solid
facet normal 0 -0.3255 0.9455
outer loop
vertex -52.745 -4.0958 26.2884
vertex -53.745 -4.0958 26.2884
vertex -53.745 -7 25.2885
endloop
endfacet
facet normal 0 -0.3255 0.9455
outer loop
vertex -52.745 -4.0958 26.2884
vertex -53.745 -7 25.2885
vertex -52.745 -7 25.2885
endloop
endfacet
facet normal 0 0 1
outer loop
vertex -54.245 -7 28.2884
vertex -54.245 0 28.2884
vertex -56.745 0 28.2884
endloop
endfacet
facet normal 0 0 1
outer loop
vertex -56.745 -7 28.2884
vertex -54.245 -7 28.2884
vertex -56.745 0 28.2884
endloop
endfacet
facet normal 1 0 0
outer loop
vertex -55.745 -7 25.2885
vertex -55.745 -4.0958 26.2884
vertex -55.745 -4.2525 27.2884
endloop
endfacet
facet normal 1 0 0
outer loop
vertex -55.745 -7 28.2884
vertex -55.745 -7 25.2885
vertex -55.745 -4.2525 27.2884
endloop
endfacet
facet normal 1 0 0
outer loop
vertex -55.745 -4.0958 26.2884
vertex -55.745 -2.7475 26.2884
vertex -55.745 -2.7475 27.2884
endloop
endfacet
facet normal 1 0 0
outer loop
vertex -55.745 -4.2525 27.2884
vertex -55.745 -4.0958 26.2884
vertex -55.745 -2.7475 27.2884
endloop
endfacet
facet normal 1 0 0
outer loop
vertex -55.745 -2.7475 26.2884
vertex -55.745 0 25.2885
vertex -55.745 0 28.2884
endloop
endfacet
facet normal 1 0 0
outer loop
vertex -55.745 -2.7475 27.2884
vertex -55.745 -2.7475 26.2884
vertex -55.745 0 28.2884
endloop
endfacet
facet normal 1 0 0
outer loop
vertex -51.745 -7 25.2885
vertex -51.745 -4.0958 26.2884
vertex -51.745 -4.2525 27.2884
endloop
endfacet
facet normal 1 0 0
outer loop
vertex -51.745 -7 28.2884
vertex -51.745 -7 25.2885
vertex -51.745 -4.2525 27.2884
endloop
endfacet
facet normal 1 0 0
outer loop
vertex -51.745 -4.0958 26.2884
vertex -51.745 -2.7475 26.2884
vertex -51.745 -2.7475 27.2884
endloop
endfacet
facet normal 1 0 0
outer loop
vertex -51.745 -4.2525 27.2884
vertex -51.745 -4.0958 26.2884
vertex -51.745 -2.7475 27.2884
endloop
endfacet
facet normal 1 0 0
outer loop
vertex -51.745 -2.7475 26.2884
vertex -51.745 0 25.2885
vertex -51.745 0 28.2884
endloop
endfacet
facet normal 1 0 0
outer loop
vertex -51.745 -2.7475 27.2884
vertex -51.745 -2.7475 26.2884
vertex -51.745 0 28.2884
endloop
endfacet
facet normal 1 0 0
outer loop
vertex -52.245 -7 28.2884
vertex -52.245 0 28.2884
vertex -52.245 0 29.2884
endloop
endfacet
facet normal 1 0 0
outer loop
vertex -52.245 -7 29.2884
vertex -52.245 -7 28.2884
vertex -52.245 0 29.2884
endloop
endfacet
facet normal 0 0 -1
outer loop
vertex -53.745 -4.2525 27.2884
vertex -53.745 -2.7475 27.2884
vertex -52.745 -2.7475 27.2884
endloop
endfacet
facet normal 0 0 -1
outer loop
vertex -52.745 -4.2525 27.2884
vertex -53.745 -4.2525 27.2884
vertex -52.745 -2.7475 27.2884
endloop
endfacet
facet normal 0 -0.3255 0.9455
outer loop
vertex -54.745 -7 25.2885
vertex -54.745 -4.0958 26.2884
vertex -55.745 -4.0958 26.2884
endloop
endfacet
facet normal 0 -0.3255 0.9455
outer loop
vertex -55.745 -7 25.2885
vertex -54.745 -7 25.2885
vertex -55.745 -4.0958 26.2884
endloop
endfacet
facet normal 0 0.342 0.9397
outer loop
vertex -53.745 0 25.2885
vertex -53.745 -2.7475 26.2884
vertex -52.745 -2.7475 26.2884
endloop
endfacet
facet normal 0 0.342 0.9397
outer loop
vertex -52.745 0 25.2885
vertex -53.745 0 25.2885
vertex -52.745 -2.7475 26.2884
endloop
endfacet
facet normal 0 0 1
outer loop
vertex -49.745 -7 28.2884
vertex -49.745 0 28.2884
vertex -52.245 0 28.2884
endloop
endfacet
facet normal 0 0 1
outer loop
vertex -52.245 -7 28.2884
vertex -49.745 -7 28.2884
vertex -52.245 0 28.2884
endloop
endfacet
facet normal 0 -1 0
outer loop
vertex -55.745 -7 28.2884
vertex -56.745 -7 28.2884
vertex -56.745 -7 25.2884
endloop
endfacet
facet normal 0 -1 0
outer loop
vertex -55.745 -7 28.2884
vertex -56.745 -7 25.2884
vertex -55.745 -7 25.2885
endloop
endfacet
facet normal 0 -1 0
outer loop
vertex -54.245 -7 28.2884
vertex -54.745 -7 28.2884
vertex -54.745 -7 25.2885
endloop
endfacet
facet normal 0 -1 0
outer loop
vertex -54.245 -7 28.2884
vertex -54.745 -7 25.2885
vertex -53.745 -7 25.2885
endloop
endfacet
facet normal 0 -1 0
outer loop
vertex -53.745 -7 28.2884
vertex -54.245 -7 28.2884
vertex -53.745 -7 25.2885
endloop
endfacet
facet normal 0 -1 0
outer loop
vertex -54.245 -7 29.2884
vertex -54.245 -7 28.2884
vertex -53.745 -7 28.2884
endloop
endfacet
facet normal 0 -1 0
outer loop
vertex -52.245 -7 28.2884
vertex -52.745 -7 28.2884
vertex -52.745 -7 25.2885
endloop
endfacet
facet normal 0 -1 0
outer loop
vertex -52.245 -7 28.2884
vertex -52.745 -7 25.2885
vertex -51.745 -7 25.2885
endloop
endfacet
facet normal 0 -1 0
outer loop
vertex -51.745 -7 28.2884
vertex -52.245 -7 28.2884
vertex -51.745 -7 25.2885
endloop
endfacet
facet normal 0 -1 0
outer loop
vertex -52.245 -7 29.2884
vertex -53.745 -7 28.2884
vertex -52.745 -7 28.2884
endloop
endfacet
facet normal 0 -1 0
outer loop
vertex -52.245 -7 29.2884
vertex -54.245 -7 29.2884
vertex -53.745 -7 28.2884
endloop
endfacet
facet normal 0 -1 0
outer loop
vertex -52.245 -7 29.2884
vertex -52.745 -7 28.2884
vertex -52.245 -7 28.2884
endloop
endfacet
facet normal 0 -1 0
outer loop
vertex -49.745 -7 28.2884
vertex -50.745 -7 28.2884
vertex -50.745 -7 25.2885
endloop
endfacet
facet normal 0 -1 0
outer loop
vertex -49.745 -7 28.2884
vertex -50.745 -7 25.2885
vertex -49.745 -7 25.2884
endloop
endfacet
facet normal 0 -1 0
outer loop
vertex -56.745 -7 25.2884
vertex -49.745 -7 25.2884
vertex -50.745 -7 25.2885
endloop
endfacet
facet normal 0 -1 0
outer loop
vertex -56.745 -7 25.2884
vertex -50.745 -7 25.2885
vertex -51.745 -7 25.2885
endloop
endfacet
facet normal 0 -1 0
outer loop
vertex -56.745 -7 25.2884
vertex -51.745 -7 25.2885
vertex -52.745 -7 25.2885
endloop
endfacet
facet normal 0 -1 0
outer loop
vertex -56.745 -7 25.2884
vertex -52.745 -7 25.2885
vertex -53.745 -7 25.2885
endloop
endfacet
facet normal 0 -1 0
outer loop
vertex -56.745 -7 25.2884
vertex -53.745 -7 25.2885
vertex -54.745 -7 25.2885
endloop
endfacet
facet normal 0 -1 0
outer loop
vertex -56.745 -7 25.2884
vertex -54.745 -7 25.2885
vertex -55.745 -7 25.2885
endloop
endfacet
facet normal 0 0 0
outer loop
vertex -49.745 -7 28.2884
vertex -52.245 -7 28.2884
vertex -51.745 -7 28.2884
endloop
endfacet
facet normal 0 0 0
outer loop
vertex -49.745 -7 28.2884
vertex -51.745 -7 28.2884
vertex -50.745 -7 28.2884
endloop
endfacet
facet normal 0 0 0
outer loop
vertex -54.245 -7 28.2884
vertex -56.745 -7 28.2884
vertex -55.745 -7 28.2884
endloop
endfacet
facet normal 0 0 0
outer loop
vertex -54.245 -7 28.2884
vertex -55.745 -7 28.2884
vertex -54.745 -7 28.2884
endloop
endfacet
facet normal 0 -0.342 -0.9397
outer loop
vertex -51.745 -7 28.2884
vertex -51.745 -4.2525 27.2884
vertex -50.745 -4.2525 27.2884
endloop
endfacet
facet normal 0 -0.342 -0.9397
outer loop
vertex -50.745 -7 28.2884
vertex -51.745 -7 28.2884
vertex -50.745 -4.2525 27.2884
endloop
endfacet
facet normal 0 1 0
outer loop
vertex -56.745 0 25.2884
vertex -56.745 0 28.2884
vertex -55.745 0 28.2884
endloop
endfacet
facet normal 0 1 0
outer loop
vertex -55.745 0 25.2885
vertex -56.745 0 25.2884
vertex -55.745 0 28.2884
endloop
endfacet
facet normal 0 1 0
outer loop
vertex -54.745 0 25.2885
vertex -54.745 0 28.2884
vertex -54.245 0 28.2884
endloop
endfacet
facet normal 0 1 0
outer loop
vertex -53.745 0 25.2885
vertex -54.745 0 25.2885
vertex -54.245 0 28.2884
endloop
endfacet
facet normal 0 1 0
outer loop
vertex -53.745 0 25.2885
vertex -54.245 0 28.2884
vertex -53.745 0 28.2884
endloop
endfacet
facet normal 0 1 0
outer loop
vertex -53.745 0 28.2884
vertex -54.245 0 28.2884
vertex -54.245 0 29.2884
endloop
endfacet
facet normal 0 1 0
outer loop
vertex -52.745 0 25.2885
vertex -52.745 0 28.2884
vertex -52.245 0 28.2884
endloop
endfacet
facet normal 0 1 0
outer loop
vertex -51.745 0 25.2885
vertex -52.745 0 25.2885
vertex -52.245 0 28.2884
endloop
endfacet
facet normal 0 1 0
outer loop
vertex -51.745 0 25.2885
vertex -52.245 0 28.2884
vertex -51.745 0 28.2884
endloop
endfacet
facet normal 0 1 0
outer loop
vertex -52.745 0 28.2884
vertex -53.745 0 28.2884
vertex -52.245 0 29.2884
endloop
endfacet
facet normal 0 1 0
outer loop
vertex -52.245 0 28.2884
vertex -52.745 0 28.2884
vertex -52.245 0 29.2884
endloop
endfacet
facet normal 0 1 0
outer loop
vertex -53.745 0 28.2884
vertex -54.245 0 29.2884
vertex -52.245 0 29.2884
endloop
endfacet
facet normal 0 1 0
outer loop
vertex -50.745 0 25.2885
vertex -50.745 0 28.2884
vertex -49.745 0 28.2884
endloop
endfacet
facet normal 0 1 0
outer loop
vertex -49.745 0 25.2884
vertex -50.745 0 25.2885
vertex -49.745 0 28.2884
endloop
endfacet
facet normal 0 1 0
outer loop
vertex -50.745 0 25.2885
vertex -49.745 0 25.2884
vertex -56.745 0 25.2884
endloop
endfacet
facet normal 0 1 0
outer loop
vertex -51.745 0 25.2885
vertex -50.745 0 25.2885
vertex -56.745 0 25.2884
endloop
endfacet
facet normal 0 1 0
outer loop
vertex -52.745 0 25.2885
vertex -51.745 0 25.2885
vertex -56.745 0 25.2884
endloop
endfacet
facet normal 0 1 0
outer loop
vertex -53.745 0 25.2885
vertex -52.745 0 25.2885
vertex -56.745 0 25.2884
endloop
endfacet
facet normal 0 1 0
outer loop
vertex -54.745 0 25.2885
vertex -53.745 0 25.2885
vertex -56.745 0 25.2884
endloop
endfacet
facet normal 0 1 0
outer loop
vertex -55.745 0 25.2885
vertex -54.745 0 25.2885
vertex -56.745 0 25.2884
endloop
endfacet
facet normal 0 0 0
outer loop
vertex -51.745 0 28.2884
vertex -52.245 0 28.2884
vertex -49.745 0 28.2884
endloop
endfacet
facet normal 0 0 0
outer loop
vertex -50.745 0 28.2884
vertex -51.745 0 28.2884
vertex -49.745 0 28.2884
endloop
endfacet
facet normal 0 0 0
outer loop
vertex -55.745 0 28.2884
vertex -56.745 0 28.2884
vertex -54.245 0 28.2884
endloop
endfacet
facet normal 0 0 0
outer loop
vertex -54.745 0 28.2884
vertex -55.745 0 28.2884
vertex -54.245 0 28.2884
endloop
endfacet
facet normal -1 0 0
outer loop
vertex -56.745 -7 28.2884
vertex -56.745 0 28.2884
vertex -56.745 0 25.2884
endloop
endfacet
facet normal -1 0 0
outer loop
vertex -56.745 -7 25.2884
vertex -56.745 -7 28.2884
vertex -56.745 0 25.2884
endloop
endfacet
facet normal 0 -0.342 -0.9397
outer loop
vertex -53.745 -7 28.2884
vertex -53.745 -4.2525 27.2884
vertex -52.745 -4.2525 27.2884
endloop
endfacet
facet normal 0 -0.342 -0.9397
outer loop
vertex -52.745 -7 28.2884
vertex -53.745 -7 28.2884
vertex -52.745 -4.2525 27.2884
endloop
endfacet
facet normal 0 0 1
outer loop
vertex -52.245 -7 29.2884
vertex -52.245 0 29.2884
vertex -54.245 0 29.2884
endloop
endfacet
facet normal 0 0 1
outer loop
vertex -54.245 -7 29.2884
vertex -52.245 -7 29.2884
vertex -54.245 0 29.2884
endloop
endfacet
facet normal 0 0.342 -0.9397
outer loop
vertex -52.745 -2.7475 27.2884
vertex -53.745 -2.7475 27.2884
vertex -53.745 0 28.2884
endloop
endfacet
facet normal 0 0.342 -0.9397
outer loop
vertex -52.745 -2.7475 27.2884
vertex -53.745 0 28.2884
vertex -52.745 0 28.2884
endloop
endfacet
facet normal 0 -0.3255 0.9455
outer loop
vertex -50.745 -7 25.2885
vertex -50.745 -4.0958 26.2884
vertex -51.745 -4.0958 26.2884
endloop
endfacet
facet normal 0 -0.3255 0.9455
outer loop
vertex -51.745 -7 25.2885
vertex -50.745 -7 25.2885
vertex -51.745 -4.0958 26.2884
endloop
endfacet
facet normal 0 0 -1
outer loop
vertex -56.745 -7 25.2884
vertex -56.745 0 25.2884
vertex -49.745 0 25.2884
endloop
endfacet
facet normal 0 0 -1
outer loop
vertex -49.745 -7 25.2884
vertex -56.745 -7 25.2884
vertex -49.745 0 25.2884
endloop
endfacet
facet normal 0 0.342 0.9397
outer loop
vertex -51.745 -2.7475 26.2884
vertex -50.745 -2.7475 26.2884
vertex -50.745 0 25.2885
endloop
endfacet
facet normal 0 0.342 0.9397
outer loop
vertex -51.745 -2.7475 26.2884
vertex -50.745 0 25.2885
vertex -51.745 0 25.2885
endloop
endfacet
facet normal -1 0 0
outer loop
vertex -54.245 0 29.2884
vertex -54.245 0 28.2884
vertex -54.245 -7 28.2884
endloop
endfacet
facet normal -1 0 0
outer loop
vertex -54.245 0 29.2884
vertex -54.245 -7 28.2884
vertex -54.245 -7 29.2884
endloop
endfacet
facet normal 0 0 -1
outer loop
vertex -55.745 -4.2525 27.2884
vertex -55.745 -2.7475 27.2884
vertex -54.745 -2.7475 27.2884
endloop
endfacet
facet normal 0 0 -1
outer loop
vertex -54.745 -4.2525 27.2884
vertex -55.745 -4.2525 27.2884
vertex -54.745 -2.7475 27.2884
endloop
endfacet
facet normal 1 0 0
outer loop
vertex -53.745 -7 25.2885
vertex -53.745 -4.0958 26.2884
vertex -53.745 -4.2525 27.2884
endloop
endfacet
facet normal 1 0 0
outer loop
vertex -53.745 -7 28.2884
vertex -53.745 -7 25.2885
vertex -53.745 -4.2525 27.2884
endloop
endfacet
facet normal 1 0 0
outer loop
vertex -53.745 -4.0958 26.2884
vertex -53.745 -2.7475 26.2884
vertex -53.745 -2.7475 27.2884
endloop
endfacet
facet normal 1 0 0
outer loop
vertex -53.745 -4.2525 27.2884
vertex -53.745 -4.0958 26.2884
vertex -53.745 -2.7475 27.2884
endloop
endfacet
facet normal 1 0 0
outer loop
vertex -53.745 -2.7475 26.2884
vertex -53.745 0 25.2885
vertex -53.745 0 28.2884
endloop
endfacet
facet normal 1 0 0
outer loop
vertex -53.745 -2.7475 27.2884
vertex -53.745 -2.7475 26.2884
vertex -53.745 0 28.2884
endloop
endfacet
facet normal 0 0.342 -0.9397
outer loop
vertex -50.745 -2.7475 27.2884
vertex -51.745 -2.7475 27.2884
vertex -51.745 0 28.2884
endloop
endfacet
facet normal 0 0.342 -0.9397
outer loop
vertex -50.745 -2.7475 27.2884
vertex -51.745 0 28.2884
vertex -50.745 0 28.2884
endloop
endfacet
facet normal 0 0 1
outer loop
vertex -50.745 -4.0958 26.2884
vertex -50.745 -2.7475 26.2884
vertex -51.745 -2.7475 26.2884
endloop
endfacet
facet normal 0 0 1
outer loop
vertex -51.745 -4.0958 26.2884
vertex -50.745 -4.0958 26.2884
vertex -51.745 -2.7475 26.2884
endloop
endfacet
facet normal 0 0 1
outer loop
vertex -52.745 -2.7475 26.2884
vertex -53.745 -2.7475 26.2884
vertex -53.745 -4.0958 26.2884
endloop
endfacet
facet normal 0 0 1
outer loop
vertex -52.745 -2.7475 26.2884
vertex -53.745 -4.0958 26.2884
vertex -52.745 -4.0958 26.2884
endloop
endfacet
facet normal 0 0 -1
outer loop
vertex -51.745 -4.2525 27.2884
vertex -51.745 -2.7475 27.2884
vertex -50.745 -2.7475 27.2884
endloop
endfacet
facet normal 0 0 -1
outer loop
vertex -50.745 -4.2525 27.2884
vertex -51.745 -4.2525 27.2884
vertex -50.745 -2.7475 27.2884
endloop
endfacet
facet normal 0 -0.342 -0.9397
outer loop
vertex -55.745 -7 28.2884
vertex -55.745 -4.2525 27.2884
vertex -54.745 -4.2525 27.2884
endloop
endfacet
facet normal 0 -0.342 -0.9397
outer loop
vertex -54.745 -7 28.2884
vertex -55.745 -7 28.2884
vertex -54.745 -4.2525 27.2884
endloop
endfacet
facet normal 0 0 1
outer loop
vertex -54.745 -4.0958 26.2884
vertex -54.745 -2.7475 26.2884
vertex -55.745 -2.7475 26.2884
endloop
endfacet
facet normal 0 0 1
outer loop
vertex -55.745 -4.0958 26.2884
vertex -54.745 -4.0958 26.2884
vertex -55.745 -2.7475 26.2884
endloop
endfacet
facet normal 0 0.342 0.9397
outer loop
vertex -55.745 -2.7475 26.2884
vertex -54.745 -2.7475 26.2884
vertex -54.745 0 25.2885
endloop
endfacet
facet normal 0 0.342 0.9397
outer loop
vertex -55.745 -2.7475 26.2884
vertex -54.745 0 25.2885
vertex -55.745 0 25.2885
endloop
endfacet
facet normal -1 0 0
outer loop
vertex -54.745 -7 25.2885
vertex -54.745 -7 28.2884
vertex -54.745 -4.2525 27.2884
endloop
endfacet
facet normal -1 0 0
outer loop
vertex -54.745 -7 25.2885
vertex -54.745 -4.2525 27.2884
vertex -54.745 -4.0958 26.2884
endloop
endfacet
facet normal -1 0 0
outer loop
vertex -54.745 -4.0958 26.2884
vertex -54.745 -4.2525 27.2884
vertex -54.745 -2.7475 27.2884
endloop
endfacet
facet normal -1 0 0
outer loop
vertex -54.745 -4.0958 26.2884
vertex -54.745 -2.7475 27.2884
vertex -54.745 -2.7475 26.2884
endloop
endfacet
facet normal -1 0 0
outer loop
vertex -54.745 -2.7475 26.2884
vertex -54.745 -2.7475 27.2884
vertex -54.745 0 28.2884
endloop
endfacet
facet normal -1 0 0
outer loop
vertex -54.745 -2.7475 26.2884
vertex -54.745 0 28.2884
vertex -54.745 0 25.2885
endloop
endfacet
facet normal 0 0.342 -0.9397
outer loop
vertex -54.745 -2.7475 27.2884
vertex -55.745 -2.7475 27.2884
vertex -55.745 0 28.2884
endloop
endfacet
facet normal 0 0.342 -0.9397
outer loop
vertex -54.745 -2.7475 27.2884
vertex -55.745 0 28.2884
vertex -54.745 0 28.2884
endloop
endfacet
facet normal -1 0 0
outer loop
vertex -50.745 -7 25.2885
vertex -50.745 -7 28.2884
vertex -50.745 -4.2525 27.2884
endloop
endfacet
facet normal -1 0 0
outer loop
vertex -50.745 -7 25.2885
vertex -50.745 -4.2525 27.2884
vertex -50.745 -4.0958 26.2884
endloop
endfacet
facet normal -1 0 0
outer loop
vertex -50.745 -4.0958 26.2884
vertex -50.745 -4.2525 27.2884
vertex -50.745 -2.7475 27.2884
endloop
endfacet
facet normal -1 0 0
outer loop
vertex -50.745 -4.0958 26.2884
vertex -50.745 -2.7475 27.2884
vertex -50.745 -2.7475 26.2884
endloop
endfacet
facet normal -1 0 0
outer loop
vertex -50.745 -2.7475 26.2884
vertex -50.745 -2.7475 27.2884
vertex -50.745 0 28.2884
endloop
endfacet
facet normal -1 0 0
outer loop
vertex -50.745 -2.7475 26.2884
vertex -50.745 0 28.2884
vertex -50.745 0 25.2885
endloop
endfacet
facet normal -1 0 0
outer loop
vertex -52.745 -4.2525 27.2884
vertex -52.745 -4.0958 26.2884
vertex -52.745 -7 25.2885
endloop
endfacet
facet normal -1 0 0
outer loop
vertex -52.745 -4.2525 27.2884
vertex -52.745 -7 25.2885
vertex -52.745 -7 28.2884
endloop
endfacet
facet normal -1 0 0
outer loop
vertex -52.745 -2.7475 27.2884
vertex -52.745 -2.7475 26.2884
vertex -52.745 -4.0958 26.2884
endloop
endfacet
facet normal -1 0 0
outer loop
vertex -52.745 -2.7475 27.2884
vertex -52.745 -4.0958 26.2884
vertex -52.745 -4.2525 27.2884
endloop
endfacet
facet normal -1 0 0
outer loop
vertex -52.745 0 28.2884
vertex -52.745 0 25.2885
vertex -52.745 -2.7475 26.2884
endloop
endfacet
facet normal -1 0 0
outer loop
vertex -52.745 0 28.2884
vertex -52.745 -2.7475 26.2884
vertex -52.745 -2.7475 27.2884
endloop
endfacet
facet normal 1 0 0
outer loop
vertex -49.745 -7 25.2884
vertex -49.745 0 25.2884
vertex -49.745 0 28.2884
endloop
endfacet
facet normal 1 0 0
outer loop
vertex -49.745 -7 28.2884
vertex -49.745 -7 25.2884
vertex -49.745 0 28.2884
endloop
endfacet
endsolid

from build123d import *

# Parameters (mm, degrees)
F0_W       = 1
F0_H       = 1
F1_DEPTH   = 7
F2_SIZE2   = 2.747467
F2_SIZE    = 0.99999
F2_2_SIZE2 = 2.747467
F2_2_SIZE  = 0.99999
F3_SIZE2   = 2.904201
F3_SIZE    = 0.99999


# Not quite as in the source:
# - a fillet or chamfer is up to 0.001 mm smaller than in the source, because OpenCascade refuses the exact size


with BuildPart() as f1:
    # F0 (on Front) → F1 (new body)
    with BuildSketch(Plane.XZ):
        Polygon((-56.745035848, 28.2884484402), (-56.745035848, 26.7884484402), (-56.745035848, 25.2884484402), (-51.245035848, 25.2884484402), (-51.245035848, 26.2884484402), (-51.745035848, 26.2884484402), (-51.745035848, 27.2884484402), (-51.245035848, 27.2884484402), (-51.245035848, 28.2884484402), (-52.245035848, 28.2884484402), (-53.245035848, 28.2884484402), (-54.245035848, 28.2884484402), align=None)
        Polygon((-54.745035848, 26.2884484402), (-55.745035848, 26.2884484402), (-55.745035848, 26.7884484402), (-55.745035848, 27.2884484402), (-54.745035848, 27.2884484402), align=None, mode=Mode.SUBTRACT)
        with Locations((-53.245035848, 26.7884484402)):
            Rectangle(F0_W, F0_H, mode=Mode.SUBTRACT)
        Polygon((-50.745035848, 26.7884484402), (-49.745035848, 26.7884484402), (-49.745035848, 28.2884484402), (-51.245035848, 28.2884484402), (-51.245035848, 27.2884484402), (-50.745035848, 27.2884484402), align=None)
        Polygon((-51.245035848, 26.2884484402), (-51.245035848, 25.2884484402), (-49.745035848, 25.2884484402), (-49.745035848, 26.7884484402), (-50.745035848, 26.7884484402), (-50.745035848, 26.2884484402), align=None)
        with Locations((-52.745035848, 28.7884484402)):
            Rectangle(F0_W, F0_H)
        with Locations((-53.745035848, 28.7884484402)):
            Rectangle(F0_W, F0_H)
    extrude(amount=F1_DEPTH)

    # F2 (size 1 and 2.7474774195 in the source; OpenCascade refuses exactly that, so slightly less here)
    f2_edges = [f1.edges().sort_by_distance(p)[0] for p in [
        (-51.245036, 0, 26.288448),
        (-51.245036, 0, 27.288448),
        (-53.245036, 0, 27.288448),
        (-53.245036, 0, 26.288448),
        (-55.245036, 0, 27.288448),
        (-55.245036, 0, 26.288448),
    ]]
    f2_side = f1.faces().sort_by_distance((-56.664413, 0, 26.788448))[0]
    chamfer(f2_edges, length=F2_SIZE, length2=F2_SIZE2, reference=f2_side)

    # F2#2 (size 1 and 2.7474774195 in the source; OpenCascade refuses exactly that, so slightly less here)
    f2_2_edges = [f1.edges().sort_by_distance(p)[0] for p in [
        (-55.245036, -7, 27.288448),
        (-53.245036, -7, 27.288448),
        (-51.245036, -7, 27.288448),
    ]]
    f2_2_side = f1.faces().sort_by_distance((-56.664413, -7, 26.788448))[0]
    chamfer(f2_2_edges, length=F2_2_SIZE, length2=F2_2_SIZE2, reference=f2_2_side)

    # F3 (size 1 and 2.9042108777 in the source; OpenCascade refuses exactly that, so slightly less here)
    f3_edges = [f1.edges().sort_by_distance(p)[0] for p in [
        (-55.245036, -7, 26.288448),
        (-53.245036, -7, 26.288448),
        (-51.245036, -7, 26.288448),
    ]]
    f3_side = f1.faces().sort_by_distance((-55.825658, -7, 27.788443))[0]
    chamfer(f3_edges, length=F3_SIZE, length2=F3_SIZE2, reference=f3_side)


solid = f1.part
